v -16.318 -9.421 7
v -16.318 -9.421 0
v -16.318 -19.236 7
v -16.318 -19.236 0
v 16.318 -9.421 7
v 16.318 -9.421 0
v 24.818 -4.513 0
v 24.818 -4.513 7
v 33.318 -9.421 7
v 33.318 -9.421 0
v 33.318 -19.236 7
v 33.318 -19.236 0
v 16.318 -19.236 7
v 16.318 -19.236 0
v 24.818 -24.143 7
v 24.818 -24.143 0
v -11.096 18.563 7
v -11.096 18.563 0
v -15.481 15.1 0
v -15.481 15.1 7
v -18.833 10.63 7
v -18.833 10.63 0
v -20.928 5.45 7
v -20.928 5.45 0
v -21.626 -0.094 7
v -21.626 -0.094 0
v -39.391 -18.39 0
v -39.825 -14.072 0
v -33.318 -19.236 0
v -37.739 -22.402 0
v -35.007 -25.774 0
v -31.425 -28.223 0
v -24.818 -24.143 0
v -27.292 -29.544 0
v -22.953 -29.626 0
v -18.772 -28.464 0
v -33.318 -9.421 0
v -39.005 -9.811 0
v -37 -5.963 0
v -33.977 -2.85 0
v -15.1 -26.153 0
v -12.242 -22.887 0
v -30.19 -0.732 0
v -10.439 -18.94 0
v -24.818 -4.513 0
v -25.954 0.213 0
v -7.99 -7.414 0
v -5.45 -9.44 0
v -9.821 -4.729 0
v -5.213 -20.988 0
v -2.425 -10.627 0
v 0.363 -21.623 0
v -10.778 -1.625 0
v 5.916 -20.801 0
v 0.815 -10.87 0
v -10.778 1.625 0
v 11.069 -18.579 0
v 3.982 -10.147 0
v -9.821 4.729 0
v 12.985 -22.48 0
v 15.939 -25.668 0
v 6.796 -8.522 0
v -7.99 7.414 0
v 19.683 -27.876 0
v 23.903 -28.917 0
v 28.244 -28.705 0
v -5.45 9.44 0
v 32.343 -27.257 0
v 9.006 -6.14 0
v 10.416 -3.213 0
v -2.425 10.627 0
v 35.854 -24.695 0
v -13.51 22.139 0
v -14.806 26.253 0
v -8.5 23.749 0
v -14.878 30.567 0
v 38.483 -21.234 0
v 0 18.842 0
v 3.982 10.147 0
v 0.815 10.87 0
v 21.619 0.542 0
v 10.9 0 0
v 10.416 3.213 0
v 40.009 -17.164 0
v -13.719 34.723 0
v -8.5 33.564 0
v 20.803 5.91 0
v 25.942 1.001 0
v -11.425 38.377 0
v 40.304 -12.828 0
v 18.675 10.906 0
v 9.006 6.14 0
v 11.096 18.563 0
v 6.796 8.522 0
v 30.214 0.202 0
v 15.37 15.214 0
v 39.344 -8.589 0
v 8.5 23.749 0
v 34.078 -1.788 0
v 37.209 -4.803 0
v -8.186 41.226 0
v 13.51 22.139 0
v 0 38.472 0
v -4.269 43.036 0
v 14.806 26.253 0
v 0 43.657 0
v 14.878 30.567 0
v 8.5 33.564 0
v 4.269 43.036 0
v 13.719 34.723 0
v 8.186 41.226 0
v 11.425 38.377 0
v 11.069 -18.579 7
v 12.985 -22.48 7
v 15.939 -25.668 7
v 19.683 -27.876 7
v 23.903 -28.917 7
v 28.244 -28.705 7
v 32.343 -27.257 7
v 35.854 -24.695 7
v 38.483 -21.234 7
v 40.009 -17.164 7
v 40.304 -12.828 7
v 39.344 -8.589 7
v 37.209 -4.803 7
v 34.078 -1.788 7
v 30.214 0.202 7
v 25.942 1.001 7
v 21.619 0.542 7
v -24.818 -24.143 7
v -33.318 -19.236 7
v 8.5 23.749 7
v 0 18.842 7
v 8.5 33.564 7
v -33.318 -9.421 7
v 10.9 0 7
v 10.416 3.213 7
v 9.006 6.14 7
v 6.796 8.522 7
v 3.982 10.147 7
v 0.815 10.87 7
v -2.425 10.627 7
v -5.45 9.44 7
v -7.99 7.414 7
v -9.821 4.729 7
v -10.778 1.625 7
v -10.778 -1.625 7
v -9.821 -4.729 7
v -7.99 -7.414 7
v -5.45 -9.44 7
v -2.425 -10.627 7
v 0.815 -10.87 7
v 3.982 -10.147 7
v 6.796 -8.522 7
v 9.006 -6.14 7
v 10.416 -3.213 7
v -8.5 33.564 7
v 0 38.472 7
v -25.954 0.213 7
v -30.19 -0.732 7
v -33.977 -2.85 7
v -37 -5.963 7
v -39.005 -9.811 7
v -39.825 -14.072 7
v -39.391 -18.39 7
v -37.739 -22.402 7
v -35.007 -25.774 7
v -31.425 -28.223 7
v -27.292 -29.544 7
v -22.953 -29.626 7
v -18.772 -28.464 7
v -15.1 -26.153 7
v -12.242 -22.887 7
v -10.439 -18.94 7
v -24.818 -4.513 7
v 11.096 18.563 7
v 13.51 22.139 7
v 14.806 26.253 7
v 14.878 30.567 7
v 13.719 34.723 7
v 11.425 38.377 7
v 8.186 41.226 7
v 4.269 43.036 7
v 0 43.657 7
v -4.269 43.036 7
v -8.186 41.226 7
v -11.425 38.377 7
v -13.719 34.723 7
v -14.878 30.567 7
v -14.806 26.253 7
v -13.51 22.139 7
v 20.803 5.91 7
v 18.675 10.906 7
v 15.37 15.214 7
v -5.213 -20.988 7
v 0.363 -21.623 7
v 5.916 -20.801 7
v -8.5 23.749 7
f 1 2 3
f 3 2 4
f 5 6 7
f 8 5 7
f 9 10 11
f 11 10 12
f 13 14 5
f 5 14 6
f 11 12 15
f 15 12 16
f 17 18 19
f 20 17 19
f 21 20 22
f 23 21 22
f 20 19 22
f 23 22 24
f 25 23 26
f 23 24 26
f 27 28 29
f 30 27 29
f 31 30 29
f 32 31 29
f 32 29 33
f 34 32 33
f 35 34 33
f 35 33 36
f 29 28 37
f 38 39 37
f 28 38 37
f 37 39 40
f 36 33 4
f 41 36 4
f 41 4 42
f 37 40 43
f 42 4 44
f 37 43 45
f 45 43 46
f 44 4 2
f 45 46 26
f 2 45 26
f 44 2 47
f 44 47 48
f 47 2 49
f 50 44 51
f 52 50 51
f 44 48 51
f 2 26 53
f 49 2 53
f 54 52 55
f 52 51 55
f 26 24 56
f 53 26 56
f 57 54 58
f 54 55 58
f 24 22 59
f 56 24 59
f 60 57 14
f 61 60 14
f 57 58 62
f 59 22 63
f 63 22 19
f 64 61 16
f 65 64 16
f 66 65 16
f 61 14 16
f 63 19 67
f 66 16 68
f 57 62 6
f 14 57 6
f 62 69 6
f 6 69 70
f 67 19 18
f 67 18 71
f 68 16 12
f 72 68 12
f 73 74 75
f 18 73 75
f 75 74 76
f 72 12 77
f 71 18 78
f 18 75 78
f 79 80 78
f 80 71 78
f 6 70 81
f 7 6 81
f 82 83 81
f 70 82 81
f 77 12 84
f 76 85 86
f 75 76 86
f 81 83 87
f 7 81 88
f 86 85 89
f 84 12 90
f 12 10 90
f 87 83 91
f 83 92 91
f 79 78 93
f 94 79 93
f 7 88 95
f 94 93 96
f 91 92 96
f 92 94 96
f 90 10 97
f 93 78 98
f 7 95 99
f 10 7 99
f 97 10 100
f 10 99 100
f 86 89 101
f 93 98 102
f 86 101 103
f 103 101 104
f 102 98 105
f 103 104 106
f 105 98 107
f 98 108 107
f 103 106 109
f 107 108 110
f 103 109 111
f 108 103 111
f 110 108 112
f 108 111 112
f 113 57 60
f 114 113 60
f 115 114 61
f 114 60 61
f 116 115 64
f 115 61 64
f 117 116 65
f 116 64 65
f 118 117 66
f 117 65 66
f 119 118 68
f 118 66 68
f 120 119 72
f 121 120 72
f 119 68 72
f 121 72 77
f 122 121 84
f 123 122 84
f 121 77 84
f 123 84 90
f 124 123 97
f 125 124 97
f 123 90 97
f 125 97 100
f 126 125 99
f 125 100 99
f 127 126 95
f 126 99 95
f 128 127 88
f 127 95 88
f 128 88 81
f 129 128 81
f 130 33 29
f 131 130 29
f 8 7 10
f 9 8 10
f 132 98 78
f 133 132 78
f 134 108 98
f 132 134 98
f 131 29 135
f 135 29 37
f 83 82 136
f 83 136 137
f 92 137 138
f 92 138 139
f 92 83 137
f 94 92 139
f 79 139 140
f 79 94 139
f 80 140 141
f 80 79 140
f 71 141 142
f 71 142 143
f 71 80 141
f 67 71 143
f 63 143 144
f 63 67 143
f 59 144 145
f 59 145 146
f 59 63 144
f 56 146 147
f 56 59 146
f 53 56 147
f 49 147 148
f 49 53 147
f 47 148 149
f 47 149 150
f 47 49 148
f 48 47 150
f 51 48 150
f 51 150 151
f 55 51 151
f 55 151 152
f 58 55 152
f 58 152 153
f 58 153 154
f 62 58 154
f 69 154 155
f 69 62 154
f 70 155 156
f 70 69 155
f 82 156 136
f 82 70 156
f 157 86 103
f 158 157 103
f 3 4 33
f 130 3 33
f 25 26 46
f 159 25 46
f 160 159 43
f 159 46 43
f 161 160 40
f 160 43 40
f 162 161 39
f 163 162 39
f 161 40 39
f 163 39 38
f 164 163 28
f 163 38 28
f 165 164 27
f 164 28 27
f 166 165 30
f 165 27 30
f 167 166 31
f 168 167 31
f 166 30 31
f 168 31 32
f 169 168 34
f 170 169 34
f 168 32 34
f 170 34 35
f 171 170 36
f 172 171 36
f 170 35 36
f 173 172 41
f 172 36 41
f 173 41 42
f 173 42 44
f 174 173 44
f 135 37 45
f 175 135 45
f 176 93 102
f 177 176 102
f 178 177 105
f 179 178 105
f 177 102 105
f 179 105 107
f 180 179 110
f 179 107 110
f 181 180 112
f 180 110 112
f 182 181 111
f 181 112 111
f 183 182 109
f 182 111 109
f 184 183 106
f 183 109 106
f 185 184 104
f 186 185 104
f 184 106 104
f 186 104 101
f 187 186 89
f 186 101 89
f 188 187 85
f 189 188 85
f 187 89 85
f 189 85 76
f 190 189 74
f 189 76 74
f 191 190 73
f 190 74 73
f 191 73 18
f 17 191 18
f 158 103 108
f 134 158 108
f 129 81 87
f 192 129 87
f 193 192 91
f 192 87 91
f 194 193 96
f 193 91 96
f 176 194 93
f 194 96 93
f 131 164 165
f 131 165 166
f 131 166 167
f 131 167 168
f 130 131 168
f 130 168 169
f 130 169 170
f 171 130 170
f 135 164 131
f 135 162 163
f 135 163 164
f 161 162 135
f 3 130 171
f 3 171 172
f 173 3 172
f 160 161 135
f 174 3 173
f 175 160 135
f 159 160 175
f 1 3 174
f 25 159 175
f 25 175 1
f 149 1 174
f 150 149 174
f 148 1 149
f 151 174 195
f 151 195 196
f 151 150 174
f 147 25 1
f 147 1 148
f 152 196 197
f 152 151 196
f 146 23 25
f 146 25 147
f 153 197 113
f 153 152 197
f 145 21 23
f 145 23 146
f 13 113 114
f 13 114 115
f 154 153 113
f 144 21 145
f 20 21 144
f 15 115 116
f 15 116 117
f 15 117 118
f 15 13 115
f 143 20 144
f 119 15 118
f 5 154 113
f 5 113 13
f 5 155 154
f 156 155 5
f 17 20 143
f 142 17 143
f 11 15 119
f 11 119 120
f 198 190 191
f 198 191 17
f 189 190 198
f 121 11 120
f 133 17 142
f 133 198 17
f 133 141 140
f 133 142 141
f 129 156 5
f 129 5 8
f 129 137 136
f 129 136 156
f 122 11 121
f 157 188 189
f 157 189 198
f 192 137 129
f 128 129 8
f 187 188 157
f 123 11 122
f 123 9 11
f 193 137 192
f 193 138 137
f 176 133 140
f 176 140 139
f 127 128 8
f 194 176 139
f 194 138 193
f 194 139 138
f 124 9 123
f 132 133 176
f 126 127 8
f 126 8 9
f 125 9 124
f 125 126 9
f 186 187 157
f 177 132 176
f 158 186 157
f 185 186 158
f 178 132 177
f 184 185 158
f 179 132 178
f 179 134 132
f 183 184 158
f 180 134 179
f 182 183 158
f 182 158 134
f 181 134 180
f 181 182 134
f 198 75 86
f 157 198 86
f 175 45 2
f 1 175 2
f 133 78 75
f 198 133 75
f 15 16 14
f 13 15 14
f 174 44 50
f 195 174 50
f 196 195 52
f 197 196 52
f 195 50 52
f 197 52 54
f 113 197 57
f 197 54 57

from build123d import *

# Parameters (mm, degrees)
F0_R     = 10.9
F1_DEPTH = 7


with BuildPart() as f1:
    # F0 (on Top) → F1 (new body)
    with BuildSketch(Plane.XY):
        with BuildLine():
            ThreePointArc((21.619418, 0.541571), (18.675118, 10.905618), (11.095609, 18.562866))
            ThreePointArc((11.095609, 18.562866), (0, 43.656797), (-11.095609, 18.562866))
            ThreePointArc((-11.095609, 18.562866), (-18.833376, 10.629979), (-21.625995, -0.094059))
            ThreePointArc((-21.625995, -0.094059), (-37.738757, -22.402484), (-10.438593, -18.940124))
            ThreePointArc((-10.438593, -18.940124), (0.363458, -21.623146), (11.069236, -18.578605))
            ThreePointArc((11.069236, -18.578605), (38.482629, -21.234049), (21.619418, 0.541571))
        make_face()
        Polygon((-16.317514, -19.235876), (-24.817514, -24.143353), (-33.317514, -19.235876), (-33.317514, -9.420921), (-24.817514, -4.513444), (-16.317514, -9.420921), align=None, mode=Mode.SUBTRACT)
        Circle(F0_R, mode=Mode.SUBTRACT)
        Polygon((24.817514, -4.513444), (33.317514, -9.420921), (33.317514, -19.235876), (24.817514, -24.143353), (16.317514, -19.235876), (16.317514, -9.420921), align=None, mode=Mode.SUBTRACT)
        Polygon((0, 38.471752), (8.5, 33.564274), (8.5, 23.74932), (0, 18.841842), (-8.5, 23.74932), (-8.5, 33.564274), align=None, mode=Mode.SUBTRACT)
    extrude(amount=F1_DEPTH)


solid = f1.part
